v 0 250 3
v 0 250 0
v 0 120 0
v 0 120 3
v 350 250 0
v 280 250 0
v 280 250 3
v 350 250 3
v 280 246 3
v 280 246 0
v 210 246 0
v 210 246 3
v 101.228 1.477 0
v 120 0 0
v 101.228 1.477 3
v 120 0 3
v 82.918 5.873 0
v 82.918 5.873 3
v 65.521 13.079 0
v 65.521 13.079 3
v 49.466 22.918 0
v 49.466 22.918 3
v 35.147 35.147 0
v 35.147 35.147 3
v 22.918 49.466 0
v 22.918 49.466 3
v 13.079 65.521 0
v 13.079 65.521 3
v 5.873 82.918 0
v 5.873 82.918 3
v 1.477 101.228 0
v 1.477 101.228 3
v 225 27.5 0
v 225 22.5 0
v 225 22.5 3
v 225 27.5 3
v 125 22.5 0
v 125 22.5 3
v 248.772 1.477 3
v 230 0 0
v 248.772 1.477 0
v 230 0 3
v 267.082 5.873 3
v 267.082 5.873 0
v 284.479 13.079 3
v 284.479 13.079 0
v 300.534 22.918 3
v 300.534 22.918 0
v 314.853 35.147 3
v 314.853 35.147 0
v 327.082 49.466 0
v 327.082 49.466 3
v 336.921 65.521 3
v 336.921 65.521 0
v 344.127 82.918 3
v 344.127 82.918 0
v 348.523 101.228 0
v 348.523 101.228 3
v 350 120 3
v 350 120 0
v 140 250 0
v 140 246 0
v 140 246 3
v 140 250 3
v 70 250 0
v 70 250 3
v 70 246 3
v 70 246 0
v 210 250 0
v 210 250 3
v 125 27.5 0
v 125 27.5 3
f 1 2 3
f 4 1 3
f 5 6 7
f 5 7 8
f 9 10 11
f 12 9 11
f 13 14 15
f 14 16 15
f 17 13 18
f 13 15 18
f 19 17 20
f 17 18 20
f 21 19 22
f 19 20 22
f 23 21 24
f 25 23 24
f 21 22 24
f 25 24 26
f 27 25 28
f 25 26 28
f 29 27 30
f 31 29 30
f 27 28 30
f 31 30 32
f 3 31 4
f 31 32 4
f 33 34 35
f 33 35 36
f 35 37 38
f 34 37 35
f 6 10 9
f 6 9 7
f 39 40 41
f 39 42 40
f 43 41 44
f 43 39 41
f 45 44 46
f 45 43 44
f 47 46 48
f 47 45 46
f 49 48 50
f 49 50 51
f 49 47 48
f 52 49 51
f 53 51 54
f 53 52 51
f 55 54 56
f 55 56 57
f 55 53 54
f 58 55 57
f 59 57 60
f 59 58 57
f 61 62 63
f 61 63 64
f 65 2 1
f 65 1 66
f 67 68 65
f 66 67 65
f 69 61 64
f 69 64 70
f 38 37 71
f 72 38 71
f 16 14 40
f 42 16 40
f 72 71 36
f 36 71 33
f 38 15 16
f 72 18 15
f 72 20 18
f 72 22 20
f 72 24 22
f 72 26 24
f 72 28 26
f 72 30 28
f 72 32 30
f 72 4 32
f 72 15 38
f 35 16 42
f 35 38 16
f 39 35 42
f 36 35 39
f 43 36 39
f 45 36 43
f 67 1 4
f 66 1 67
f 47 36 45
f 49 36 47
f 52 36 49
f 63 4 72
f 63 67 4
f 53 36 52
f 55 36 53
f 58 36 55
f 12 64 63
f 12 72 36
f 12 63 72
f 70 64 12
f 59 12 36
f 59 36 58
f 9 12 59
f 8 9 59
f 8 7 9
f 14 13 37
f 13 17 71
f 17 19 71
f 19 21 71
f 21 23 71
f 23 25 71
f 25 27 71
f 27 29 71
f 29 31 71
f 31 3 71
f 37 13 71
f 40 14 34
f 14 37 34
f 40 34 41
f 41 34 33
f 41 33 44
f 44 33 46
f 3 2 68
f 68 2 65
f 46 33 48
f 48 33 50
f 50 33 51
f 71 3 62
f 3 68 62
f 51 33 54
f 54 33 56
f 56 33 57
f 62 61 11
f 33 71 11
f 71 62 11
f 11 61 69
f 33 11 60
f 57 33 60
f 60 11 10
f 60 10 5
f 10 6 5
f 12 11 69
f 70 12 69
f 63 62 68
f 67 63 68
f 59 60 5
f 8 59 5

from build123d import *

# Parameters (mm, degrees)
F0_W     = 100
F0_H     = 5
F0_W_2   = 70
F0_H_2   = 4
F1_DEPTH = 3
F2_R     = 120


with BuildPart() as f1:
    # F0 (on Top) → F1 (new body)
    with BuildSketch(Plane.XY):
        Polygon((0, 246), (0, 0), (350, 0), (350, 246), (280, 246), (210, 246), (140, 246), (70, 246), align=None)
        with Locations((175, 25)):
            Rectangle(F0_W, F0_H, mode=Mode.SUBTRACT)
        with Locations((175, 248)):
            Rectangle(F0_W_2, F0_H_2)
        with Locations((315, 248)):
            Rectangle(F0_W_2, F0_H_2)
        with Locations((35, 248)):
            Rectangle(F0_W_2, F0_H_2)
    extrude(amount=F1_DEPTH)

    # F2
    f2_edges = [f1.edges().sort_by_distance(p)[0] for p in [
        (0, 0, 1.5),
        (350, 0, 1.5),
    ]]
    fillet(f2_edges, radius=F2_R)


solid = f1.part
